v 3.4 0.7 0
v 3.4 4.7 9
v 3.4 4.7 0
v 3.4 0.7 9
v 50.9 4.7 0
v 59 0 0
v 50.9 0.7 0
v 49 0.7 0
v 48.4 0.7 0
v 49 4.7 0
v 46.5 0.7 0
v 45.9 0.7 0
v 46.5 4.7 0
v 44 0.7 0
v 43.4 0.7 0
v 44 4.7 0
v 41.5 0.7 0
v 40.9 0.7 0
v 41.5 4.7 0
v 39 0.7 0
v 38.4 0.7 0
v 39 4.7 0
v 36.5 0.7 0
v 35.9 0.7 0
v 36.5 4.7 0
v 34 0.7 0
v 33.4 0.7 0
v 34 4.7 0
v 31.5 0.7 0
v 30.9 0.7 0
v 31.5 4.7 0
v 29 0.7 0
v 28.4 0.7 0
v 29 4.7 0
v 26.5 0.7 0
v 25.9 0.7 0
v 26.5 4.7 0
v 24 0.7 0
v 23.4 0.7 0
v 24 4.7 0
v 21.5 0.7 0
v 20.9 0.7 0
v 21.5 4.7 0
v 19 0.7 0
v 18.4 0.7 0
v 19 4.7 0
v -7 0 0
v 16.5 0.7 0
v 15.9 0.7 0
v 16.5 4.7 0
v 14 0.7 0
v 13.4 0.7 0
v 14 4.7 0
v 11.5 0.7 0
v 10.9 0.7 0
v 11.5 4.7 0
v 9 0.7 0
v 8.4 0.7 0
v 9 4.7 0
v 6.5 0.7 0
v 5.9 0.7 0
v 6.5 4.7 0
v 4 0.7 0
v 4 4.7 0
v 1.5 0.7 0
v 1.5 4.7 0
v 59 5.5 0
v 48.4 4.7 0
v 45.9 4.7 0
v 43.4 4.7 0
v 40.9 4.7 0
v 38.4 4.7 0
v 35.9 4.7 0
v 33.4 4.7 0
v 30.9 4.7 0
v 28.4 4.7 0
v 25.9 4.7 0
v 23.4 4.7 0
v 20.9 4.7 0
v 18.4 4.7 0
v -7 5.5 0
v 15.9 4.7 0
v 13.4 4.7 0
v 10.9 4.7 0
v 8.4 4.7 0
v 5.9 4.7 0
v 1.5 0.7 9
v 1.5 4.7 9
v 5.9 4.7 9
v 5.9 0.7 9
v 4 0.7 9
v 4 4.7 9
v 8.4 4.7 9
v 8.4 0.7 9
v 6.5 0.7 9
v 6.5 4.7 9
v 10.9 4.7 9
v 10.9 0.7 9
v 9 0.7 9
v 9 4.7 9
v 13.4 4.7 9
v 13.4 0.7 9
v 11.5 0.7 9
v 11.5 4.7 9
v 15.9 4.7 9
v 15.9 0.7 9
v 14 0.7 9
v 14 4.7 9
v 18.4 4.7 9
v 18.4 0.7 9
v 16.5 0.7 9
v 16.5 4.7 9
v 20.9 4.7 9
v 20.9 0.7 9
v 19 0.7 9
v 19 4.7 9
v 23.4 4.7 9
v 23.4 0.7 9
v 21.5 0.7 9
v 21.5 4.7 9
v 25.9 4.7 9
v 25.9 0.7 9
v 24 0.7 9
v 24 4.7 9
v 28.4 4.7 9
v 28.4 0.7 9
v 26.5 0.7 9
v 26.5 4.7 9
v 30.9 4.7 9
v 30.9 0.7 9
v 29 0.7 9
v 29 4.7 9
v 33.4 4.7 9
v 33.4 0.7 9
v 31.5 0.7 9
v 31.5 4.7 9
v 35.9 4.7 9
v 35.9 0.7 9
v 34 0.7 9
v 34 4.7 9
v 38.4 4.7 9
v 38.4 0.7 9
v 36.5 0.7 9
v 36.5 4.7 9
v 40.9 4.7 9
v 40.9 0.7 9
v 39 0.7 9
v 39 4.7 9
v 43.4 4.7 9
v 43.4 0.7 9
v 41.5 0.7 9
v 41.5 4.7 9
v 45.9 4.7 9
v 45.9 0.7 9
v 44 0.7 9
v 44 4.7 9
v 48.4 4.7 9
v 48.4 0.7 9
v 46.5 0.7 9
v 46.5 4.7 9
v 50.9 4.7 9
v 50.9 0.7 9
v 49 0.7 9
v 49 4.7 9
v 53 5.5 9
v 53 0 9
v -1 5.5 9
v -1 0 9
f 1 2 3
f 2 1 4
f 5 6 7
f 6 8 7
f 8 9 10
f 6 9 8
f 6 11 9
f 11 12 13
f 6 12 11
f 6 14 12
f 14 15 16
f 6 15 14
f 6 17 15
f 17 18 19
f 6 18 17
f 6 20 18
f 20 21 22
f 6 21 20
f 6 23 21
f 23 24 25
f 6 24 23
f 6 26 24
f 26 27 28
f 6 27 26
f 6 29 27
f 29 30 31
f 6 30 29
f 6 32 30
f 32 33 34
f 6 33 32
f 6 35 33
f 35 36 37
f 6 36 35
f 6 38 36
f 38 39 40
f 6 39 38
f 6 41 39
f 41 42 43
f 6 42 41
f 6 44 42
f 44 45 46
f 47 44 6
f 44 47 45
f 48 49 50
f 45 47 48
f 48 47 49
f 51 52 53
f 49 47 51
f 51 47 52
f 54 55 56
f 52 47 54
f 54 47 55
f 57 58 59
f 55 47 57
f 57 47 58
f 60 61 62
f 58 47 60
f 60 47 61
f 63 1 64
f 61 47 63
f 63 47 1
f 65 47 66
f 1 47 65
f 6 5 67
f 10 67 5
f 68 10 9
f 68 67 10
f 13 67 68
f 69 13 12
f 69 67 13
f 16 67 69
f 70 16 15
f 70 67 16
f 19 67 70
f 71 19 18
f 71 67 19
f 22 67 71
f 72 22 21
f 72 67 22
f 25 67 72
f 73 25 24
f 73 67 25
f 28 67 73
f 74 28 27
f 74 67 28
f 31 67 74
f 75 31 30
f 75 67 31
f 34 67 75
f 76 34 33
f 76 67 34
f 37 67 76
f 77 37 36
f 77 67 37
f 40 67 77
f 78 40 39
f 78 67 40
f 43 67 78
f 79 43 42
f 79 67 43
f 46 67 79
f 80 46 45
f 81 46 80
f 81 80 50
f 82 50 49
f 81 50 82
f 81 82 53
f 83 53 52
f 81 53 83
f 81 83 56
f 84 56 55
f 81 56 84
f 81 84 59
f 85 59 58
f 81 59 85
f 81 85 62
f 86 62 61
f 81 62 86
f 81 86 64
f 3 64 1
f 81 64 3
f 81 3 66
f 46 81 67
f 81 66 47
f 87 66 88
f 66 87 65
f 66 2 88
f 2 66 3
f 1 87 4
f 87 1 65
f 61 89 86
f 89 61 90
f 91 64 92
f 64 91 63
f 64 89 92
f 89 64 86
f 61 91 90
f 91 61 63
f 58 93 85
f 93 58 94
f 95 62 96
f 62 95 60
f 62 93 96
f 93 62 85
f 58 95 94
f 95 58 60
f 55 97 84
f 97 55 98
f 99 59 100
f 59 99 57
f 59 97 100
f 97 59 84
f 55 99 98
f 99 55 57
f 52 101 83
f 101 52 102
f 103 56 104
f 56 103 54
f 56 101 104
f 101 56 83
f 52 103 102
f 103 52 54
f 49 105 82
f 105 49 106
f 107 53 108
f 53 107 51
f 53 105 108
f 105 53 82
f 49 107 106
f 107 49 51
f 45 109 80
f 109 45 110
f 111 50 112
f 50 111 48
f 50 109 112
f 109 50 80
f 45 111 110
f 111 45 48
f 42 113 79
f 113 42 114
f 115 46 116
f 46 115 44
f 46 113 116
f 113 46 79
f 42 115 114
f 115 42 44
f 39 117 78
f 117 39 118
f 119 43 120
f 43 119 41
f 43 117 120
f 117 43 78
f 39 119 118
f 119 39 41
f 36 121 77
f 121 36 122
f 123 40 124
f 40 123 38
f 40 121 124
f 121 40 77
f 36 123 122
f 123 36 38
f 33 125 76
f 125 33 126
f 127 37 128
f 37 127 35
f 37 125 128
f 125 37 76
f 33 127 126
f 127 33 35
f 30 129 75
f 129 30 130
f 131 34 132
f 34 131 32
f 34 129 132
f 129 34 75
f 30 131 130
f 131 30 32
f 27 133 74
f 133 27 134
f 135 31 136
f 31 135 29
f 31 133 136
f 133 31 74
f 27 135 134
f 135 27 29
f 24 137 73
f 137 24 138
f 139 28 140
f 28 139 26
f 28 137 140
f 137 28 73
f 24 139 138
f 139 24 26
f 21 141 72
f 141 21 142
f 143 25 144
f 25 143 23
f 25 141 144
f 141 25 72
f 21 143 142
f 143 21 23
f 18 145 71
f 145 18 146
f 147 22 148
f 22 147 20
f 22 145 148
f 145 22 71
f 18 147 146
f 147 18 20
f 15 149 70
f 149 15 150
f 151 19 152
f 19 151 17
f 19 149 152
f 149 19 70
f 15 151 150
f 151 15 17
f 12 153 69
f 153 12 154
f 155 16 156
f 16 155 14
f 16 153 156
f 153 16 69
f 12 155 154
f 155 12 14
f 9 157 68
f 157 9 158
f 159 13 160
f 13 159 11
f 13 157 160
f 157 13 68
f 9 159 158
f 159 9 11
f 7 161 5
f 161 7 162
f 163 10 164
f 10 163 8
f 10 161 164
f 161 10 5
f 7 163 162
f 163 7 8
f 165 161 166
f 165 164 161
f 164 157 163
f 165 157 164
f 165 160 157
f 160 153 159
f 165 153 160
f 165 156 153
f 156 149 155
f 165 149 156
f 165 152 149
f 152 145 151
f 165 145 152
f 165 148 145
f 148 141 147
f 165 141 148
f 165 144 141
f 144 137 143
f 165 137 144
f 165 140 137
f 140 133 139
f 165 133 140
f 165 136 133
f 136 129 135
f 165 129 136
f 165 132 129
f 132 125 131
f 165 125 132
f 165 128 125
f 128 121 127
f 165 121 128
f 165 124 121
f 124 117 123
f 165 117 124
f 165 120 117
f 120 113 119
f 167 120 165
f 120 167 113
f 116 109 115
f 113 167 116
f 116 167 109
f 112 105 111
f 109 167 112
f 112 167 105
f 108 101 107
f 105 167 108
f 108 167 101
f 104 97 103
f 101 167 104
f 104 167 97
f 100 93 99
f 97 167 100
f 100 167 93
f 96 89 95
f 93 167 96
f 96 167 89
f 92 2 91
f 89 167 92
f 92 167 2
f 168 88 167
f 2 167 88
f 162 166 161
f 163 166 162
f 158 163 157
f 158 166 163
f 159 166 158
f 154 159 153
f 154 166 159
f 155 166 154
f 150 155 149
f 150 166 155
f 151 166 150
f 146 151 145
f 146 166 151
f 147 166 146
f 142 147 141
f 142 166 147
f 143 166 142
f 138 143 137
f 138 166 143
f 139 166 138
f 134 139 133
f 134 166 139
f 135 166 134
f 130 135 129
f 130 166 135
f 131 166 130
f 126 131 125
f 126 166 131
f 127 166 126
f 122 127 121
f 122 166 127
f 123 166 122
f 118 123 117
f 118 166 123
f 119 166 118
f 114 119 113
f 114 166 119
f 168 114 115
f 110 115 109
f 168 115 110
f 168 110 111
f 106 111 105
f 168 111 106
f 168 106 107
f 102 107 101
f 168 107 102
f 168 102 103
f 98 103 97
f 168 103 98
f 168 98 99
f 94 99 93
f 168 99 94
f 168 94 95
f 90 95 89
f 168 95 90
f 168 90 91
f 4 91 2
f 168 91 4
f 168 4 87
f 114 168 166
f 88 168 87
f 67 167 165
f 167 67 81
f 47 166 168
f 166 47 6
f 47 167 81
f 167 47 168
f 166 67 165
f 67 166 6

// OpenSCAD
$fa = 50;

rectangle_x = 52;
rectangle_y = 5.5;
rectangle_z = 9;

cutout_x = 1.9;
cutout_y = 4;
cutout_z = 12;


difference() {
    cube([rectangle_x,rectangle_y,rectangle_z], center=false);

    for(x = [1:1:20]) {
        translate([x*2.5 - 1, 0.7,0])
            cube([cutout_x, cutout_y, cutout_z], center=false);
    }
}

triangle_points1 = [
  [  -7,  0,  0 ],  //0
  [ 0,  0,  0 ],  //1
  [ 0,  rectangle_y,  0 ],  //2
  [  -7,  rectangle_y,  0 ],  //3
  [  -1,  0,  rectangle_z ],  //4
  [ 0,  0,  rectangle_z ],  //5
  [ 0,  rectangle_y,  rectangle_z ],  //6
  [  -1,  rectangle_y,  rectangle_z ]]; //7
  
triangle_face1 = [
  [0,1,2,3],  // bottom
  [4,5,1,0],  // front
  [7,6,5,4],  // top
  [5,6,2,1],  // right
  [6,7,3,2],  // back
  [7,4,0,3]]; // left
  
polyhedron( triangle_points1, triangle_face1 );

triangle_points2 = [
  [  rectangle_x + 7,  0,  0 ],  //0
  [ rectangle_x,  0,  0 ],  //1
  [ rectangle_x,  rectangle_y,  0 ],  //2
  [  rectangle_x + 7,  rectangle_y,  0 ],  //3
  [  rectangle_x + 1,  0,  rectangle_z ],  //4
  [ rectangle_x,  0,  rectangle_z ],  //5
  [ rectangle_x,  rectangle_y,  rectangle_z ],  //6
  [  rectangle_x + 1,  rectangle_y,  rectangle_z ]]; //7
  
triangle_face2 = [
  [0,1,2,3],  // bottom
  [4,5,1,0],  // front
  [7,6,5,4],  // top
  [5,6,2,1],  // right
  [6,7,3,2],  // back
  [7,4,0,3]]; // left
  
polyhedron( triangle_points2, triangle_face2 );
